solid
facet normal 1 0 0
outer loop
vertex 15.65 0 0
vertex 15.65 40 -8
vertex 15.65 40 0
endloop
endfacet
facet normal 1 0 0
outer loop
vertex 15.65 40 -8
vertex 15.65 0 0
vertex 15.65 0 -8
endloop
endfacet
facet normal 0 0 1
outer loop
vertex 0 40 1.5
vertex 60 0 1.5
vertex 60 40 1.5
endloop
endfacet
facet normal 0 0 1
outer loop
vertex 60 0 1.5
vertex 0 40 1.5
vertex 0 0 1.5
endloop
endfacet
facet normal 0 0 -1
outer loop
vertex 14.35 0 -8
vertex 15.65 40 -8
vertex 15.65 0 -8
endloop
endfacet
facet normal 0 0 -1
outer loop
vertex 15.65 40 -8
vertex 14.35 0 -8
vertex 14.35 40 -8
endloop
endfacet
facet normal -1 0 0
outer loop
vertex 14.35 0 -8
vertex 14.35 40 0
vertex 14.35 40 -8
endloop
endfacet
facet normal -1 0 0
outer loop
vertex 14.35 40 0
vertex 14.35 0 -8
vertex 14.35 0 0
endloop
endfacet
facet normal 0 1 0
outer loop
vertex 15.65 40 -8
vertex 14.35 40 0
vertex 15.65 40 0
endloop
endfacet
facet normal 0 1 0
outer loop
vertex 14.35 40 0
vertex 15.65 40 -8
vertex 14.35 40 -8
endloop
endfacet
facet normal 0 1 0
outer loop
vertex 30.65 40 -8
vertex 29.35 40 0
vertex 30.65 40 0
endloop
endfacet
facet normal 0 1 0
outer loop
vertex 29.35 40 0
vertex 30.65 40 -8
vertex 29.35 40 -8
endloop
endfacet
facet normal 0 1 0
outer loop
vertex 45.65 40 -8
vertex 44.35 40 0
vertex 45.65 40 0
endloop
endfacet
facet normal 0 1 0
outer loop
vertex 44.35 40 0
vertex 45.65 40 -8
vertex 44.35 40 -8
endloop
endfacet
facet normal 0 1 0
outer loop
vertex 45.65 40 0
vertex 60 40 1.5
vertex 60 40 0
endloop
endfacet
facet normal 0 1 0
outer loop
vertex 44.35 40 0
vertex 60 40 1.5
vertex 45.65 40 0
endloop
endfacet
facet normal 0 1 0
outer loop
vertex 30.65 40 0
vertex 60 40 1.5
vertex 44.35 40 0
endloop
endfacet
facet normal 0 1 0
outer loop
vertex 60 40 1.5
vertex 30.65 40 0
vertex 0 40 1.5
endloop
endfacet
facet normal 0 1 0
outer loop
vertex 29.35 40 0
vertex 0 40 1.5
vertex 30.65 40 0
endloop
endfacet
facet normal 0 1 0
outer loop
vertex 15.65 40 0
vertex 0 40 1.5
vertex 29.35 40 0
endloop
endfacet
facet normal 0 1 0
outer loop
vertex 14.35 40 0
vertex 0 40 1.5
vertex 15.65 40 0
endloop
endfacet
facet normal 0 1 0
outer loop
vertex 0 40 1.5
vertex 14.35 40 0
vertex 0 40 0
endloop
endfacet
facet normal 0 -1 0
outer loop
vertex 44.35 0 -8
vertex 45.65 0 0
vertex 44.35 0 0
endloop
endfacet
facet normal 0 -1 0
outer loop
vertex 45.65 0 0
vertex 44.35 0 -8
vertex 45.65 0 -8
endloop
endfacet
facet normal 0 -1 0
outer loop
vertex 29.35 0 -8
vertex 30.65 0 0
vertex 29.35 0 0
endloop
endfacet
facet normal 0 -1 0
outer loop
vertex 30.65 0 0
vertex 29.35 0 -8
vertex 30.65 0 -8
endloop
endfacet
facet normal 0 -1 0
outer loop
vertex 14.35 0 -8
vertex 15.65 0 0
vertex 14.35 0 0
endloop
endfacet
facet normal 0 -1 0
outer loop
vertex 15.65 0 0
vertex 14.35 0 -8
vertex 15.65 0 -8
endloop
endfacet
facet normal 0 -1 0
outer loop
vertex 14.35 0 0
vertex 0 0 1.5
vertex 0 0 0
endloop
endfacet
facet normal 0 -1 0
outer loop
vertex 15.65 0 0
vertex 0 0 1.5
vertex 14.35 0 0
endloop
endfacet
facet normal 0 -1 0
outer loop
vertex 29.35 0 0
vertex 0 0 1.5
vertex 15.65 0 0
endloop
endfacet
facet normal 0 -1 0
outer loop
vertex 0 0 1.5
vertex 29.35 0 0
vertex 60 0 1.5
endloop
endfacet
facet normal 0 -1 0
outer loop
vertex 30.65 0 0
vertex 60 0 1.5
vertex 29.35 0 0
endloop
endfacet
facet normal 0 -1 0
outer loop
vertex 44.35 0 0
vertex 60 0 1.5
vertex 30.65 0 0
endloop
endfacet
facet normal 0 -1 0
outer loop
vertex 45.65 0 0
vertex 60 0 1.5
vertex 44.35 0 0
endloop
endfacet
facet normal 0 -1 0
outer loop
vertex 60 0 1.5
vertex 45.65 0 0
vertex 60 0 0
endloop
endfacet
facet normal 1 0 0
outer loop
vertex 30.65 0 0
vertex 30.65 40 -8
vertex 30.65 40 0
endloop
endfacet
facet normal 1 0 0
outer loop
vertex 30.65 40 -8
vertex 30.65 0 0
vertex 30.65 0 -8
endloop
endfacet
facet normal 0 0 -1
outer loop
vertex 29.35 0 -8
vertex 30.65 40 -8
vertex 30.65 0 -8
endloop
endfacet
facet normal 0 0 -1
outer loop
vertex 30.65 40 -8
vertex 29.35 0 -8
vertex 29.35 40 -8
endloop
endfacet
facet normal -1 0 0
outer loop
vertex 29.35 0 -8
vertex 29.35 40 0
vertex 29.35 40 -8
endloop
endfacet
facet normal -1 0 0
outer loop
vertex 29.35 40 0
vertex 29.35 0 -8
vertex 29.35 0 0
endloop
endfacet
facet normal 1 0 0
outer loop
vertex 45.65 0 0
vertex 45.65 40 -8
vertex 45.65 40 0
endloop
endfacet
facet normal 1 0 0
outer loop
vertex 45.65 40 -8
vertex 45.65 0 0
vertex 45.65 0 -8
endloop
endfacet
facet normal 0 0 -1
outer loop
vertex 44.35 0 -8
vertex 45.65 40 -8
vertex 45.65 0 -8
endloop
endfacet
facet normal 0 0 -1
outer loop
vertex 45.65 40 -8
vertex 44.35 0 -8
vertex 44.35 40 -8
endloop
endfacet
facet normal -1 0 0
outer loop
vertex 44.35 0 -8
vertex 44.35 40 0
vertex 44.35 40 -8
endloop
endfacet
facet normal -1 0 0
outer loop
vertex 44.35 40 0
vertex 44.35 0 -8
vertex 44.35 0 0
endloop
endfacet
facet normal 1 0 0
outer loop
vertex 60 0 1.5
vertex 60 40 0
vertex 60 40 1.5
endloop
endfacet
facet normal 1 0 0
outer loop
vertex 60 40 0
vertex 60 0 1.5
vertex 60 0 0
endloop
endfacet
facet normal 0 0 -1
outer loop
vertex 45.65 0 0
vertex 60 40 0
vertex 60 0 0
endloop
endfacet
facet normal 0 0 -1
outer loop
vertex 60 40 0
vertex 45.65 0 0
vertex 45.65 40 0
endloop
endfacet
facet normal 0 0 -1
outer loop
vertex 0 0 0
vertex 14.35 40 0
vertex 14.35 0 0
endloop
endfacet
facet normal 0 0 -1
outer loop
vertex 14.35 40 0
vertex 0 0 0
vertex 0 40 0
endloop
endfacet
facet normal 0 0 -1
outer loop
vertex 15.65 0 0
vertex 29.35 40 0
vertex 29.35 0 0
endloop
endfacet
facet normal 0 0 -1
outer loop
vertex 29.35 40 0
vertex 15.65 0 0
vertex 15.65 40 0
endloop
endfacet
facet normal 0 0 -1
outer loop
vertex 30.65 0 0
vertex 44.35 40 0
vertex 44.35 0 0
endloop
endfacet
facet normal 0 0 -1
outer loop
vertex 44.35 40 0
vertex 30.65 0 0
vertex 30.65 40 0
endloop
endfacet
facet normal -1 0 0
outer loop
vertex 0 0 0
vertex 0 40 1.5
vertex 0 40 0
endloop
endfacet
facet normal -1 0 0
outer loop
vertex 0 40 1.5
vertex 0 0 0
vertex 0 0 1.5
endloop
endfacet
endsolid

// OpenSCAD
$fn = 32;

// ----------------------------------------------------------------------
// Ribbed panel: 1.5 mm panel
// ----------------------------------------------------------------------

// --- parameters (mm) ---
panel_l = 60;             // panel length, X
panel_w = 40;             // panel width, Y
panel_t = 1.5;            // panel thickness, Z
rib_t = 1.3;              // rib thickness
rib_h = 8;                // rib height below the panel
ribs = 3;                 // number of ribs

total_h = panel_t + rib_h;  // overall height

union() {
  cube([panel_l, panel_w, panel_t]);
  for (i = [1 : ribs])
    translate([i * panel_l / (ribs + 1) - rib_t / 2, 0, -rib_h])
      cube([rib_t, panel_w, rib_h + panel_t]);
}
